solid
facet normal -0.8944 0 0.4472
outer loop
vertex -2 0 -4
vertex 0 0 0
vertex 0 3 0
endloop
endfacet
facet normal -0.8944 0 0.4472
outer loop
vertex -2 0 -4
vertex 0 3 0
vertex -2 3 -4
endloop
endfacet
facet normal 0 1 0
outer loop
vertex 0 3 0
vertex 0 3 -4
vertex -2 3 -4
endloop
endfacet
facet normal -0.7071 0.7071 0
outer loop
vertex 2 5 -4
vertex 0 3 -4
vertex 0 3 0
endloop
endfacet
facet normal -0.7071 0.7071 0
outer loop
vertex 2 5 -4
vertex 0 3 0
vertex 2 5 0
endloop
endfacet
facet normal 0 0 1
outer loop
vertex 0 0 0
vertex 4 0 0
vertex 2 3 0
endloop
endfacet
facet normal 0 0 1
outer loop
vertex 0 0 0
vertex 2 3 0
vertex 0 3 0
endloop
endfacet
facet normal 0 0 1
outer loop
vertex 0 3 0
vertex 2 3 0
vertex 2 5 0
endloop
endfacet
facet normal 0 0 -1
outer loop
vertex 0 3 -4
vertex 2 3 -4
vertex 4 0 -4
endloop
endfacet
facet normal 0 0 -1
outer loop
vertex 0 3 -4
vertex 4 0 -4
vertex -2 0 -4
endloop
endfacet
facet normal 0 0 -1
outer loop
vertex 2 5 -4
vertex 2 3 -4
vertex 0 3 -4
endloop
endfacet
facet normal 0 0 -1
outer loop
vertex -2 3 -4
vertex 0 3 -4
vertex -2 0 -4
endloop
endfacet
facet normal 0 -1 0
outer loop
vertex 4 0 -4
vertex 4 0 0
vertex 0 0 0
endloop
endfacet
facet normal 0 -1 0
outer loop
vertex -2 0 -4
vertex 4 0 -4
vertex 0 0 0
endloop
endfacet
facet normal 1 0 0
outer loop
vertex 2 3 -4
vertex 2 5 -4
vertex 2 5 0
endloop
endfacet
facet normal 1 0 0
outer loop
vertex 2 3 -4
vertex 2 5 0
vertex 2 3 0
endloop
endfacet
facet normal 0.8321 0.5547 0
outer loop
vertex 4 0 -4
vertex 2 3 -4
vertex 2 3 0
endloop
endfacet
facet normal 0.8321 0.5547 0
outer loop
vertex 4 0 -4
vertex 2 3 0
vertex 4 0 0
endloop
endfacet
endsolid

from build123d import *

# Parameters (mm, degrees)
BOSS_EXTRUDE1_DEPTH = 3
BOSS_EXTRUDE2_DEPTH = 4


with BuildPart() as part:
    # Sketch1 → Boss-Extrude1 (new body)
    with BuildSketch(Plane(origin=(0, 0, 0), x_dir=(1, 0, 0), z_dir=(0, 1, 0))):
        Polygon((0, 0), (-2, 4), (0, 4), align=None)
    extrude(amount=BOSS_EXTRUDE1_DEPTH)

    # Sketch2 → Boss-Extrude2 (add)
    with BuildSketch(Plane(origin=(0, 0, -4), x_dir=(-1, 0, 0), z_dir=(0, 0, -1))):
        Polygon((0, 3), (-2, 5), (-2, 3), (-4, 0), (0, 0), align=None)
    extrude(amount=-BOSS_EXTRUDE2_DEPTH)


solid = part.part
